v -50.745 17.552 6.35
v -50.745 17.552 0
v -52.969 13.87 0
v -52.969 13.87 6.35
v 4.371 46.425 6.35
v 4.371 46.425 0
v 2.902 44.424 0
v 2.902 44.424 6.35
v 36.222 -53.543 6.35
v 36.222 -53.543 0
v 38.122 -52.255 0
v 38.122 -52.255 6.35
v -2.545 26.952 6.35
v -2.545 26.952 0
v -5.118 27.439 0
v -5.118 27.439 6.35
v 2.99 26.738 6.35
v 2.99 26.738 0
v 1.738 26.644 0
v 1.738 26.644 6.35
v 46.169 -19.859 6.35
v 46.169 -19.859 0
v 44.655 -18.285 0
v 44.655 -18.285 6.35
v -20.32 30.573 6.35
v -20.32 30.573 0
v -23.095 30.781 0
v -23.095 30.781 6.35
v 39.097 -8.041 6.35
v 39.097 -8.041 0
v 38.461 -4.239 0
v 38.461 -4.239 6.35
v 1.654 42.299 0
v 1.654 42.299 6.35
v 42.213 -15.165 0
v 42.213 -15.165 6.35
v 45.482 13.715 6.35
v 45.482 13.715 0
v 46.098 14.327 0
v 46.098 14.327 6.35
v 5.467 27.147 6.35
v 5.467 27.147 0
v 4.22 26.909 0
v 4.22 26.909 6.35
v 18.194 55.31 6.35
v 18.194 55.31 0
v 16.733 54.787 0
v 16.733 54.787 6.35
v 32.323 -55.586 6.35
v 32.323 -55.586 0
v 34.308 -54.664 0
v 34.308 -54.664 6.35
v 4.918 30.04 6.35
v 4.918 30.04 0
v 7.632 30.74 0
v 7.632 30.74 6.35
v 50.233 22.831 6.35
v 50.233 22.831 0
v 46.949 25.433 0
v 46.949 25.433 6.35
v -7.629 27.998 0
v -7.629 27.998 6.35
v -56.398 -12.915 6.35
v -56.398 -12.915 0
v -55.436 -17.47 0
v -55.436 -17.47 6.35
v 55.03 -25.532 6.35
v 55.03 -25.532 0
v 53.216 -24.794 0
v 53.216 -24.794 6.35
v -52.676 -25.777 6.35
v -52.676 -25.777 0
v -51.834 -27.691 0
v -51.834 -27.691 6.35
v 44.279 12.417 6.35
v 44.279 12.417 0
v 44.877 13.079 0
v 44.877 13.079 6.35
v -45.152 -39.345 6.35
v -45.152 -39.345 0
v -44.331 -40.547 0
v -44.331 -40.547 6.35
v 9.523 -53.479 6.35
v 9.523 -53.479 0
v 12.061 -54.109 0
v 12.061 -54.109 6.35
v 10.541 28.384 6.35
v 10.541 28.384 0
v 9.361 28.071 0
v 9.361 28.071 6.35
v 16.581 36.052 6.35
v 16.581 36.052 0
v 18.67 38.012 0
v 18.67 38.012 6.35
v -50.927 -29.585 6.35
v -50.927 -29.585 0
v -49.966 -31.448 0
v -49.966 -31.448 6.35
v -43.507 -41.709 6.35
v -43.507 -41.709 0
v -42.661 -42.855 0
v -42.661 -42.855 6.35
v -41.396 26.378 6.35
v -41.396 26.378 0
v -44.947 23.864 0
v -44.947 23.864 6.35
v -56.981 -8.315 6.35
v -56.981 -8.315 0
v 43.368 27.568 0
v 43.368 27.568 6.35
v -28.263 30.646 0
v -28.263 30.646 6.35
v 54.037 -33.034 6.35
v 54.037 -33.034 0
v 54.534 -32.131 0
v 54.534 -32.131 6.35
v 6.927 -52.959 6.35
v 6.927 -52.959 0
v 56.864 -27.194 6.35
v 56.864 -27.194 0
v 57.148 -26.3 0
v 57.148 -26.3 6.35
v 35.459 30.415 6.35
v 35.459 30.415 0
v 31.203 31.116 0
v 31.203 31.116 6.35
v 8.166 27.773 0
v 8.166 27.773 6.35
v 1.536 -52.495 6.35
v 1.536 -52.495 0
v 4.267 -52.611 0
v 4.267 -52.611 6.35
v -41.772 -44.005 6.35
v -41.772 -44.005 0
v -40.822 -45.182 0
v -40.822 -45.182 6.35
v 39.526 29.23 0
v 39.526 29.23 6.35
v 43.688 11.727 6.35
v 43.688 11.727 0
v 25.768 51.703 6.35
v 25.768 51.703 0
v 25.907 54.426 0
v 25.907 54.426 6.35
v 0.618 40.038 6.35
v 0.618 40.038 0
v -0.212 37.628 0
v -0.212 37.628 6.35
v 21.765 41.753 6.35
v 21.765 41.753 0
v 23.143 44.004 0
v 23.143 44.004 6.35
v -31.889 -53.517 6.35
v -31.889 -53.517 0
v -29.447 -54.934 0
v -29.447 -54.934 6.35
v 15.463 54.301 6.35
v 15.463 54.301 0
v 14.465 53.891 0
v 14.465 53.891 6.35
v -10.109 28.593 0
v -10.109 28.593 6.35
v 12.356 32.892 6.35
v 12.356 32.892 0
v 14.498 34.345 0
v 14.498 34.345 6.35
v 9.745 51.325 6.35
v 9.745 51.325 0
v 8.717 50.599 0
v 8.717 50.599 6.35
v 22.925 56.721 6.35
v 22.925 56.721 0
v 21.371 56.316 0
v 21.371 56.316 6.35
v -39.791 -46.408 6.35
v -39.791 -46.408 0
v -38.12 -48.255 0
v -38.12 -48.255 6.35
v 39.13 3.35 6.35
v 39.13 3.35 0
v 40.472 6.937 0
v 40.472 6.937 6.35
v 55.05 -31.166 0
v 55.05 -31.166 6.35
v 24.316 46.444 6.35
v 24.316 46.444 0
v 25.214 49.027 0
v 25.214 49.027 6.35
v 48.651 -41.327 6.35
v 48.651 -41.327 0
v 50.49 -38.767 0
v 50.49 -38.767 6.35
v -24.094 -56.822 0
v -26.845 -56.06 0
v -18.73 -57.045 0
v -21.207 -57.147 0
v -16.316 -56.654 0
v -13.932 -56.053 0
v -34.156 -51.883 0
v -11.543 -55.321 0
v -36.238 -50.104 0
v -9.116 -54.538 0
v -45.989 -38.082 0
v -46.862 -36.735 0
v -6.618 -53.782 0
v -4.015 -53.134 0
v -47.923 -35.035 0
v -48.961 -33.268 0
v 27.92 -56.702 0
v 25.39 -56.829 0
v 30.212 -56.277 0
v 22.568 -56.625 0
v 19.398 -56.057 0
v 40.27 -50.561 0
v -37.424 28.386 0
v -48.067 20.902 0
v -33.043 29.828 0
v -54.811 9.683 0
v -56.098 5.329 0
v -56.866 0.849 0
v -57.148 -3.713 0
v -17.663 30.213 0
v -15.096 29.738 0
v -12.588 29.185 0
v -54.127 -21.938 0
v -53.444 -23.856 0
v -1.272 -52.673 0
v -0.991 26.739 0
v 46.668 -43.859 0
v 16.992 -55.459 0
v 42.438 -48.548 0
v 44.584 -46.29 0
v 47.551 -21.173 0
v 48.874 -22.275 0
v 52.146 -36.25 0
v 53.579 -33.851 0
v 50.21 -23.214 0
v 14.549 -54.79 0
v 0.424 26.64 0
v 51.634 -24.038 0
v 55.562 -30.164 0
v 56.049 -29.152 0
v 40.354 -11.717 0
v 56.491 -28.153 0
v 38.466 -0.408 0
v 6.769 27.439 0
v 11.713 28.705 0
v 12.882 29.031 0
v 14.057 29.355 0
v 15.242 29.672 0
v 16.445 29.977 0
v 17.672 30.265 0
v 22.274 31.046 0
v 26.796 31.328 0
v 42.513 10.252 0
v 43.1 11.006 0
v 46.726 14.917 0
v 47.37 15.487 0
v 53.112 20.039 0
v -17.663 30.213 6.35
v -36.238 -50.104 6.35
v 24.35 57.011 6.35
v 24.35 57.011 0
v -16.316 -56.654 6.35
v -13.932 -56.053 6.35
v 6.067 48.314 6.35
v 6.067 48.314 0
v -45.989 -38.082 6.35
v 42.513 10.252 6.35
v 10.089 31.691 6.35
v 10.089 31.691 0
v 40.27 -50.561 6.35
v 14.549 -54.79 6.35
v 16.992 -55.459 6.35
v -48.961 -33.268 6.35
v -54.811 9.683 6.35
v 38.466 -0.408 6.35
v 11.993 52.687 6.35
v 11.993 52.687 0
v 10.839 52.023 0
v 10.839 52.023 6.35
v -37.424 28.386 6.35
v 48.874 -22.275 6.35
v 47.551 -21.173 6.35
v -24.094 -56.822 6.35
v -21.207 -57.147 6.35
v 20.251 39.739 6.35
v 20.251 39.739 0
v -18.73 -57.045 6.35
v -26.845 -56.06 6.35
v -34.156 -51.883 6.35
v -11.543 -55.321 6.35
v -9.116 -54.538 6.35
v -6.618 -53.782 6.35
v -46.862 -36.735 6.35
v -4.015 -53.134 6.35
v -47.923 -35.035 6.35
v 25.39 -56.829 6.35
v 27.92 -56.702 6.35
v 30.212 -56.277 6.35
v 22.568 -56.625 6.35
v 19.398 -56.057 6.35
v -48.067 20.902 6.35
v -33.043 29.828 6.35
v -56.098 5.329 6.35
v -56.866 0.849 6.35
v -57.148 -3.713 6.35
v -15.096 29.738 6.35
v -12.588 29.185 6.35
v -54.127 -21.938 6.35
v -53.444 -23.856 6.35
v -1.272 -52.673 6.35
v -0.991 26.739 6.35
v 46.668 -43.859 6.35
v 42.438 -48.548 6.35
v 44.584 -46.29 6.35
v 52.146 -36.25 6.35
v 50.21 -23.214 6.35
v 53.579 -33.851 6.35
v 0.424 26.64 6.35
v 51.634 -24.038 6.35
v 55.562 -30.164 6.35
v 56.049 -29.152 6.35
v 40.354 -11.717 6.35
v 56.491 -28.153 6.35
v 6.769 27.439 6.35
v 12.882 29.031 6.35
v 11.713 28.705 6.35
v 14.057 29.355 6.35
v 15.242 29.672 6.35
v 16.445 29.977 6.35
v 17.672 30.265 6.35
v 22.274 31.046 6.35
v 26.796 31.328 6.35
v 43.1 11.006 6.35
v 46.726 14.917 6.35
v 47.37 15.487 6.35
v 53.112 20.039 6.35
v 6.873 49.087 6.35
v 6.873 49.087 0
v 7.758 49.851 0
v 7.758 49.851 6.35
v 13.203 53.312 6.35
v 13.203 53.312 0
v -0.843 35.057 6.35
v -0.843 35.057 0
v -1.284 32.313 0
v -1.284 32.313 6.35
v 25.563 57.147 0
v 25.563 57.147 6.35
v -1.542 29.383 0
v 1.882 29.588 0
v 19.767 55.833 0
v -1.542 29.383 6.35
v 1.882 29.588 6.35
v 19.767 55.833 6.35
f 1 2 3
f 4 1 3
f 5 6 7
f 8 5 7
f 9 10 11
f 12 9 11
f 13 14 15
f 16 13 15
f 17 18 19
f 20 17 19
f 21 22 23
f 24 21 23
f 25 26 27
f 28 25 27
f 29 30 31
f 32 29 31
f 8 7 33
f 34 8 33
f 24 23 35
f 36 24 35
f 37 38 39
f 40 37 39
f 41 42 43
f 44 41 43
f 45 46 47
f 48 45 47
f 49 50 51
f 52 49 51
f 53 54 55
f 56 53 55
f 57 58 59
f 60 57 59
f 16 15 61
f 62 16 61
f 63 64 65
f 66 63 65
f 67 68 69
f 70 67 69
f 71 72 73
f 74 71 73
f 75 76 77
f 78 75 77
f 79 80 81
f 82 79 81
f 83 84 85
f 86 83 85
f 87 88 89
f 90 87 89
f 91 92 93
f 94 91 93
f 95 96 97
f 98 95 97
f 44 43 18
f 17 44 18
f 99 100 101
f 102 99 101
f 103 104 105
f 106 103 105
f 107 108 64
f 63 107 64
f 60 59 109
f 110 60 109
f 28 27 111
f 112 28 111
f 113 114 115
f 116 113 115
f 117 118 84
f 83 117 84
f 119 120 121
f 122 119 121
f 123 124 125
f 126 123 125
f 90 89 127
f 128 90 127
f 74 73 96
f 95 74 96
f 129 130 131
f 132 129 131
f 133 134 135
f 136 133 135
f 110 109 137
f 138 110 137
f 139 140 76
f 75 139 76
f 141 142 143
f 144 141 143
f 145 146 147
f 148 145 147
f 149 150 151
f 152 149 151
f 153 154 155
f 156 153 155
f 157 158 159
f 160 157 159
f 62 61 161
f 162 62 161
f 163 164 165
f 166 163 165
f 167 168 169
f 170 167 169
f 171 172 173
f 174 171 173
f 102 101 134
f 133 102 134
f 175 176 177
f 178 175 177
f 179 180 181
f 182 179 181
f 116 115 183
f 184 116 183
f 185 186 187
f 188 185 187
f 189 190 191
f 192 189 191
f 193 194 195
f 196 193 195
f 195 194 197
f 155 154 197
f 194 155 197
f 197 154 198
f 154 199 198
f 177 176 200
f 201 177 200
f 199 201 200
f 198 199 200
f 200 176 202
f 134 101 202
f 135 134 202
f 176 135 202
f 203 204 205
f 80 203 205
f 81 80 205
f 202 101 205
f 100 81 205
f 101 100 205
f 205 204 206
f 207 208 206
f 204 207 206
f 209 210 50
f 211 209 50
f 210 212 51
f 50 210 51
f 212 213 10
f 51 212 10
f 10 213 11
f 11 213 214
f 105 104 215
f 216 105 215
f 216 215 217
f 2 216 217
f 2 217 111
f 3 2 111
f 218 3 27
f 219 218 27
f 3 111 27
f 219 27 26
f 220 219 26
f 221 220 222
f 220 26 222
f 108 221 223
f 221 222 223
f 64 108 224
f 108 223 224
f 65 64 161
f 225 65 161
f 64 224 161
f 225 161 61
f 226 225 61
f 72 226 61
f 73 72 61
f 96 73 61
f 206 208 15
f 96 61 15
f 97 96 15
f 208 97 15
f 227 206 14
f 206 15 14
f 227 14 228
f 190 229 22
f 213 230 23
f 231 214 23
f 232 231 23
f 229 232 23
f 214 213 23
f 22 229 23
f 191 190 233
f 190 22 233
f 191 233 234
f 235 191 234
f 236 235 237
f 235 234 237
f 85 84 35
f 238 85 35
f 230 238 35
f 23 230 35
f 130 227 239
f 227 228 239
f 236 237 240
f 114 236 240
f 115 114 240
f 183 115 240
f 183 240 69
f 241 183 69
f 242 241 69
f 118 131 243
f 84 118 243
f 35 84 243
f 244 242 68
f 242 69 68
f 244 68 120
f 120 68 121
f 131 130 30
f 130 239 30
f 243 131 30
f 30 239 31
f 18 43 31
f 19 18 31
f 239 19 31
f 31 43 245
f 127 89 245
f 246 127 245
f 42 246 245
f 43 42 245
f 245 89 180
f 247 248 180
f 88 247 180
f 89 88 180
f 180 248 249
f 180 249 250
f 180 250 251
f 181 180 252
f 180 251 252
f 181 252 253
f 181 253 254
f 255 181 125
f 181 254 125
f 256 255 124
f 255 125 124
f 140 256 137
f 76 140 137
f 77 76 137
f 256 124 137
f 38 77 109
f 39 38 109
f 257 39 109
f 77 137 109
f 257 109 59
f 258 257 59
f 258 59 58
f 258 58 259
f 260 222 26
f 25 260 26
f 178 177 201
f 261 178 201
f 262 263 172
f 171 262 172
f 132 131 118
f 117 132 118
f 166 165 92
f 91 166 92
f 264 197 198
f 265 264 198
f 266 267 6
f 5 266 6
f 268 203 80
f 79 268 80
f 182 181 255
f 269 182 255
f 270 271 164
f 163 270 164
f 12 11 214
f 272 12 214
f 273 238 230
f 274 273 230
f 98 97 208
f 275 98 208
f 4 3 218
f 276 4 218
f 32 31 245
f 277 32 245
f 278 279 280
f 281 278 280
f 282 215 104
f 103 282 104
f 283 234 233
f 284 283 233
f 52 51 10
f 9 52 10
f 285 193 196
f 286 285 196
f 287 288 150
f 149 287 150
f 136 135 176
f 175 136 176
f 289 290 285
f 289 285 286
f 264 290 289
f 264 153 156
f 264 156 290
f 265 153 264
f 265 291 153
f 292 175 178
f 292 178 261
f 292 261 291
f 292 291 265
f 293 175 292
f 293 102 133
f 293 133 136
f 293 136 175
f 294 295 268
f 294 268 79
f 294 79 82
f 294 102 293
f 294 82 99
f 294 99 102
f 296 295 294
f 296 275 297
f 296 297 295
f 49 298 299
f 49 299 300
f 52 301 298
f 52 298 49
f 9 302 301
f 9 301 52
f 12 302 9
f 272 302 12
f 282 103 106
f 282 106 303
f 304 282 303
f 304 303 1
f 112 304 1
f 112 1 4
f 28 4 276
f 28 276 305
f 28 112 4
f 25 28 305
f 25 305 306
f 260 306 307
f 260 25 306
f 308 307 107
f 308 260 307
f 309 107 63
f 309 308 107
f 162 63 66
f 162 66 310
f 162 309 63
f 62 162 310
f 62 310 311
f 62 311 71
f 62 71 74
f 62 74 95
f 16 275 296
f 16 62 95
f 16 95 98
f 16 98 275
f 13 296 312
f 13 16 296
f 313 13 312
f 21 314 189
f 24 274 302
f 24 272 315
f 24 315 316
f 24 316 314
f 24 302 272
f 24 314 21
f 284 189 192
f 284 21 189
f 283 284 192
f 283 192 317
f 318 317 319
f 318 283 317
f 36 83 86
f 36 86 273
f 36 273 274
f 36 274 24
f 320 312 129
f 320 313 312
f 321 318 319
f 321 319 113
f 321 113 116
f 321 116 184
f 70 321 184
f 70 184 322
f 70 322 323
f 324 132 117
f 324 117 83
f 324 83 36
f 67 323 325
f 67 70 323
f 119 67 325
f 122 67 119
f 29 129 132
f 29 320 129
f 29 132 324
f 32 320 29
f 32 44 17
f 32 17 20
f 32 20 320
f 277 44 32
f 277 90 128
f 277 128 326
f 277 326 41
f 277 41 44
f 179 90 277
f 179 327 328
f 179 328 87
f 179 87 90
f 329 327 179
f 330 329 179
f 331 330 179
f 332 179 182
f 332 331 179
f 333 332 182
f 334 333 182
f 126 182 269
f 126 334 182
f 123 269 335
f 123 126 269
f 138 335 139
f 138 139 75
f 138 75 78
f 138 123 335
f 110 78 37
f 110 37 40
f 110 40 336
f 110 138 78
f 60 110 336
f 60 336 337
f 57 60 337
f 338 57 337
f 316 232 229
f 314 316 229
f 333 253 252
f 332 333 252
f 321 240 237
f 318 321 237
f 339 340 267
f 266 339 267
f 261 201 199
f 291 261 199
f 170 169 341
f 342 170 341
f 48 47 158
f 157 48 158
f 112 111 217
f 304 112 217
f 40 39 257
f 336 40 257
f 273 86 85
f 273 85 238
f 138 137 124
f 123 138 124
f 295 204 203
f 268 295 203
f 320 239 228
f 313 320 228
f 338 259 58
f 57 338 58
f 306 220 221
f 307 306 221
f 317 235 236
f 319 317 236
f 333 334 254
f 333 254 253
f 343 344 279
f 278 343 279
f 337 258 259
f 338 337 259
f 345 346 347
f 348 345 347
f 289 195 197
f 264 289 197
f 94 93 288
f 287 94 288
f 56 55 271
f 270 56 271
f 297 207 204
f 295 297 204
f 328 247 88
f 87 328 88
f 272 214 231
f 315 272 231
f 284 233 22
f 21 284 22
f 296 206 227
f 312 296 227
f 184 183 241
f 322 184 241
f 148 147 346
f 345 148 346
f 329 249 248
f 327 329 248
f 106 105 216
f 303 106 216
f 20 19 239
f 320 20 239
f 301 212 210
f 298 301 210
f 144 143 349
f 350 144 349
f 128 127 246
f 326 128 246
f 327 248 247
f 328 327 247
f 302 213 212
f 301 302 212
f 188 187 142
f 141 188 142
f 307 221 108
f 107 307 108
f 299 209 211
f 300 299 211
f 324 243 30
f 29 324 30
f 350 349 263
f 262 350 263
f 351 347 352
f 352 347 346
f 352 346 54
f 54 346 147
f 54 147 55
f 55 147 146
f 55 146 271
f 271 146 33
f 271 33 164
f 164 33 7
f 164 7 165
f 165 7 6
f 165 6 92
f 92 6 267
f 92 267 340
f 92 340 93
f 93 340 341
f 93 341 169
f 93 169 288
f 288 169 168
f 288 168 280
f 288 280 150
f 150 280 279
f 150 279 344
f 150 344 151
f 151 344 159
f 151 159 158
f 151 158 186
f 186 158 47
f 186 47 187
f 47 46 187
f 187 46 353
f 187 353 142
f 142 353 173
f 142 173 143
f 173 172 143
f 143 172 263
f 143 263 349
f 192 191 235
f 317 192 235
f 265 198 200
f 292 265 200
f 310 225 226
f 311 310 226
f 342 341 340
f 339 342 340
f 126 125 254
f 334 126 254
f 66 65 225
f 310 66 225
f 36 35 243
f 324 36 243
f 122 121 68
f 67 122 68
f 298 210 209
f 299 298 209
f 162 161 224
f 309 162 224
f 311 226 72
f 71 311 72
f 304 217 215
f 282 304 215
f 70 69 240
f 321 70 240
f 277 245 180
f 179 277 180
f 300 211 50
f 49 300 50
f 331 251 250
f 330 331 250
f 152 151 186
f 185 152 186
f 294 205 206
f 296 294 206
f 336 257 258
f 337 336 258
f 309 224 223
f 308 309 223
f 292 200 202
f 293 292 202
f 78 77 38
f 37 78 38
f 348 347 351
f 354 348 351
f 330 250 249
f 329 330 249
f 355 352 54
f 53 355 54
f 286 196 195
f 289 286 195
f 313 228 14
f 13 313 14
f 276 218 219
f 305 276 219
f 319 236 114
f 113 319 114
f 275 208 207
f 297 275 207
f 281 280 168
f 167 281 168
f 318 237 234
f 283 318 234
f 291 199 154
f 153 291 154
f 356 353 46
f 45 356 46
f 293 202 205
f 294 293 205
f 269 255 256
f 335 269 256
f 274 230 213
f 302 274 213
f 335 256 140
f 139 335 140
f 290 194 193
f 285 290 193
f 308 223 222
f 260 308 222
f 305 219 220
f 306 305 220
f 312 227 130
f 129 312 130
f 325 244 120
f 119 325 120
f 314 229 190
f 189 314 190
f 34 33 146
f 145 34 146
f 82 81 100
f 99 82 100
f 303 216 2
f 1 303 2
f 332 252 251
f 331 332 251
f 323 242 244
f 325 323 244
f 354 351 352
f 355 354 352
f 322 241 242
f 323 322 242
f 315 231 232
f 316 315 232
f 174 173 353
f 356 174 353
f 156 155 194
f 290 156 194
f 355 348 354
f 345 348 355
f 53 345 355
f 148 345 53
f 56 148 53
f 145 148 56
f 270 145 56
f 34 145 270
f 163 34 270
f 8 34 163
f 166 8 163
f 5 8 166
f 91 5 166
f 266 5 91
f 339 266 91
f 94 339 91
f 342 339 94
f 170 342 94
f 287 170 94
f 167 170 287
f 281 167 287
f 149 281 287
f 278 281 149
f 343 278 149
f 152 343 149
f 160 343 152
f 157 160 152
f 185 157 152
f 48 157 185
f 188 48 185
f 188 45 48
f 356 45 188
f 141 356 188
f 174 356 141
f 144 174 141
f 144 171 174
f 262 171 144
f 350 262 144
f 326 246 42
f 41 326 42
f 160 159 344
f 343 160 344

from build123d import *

# Parameters (mm, degrees)
F1_DEPTH = 6.35
F2_DEPTH = 6.35


with BuildPart() as f1:
    # F0 (on Top) → F1 (new body)
    with BuildSketch(Plane.XY):
        Polygon((56.864021, -27.194281), (57.148324, -26.299795), (55.02971, -25.532283), (53.215718, -24.794286), (51.633501, -24.037595), (50.210415, -23.214), (48.873715, -22.27519), (47.550705, -21.172983), (46.168716, -19.859092), (44.655003, -18.285384), (42.213124, -15.164587), (40.354123, -11.71669), (39.097001, -8.041386), (38.461112, -4.2386), (38.465506, -0.408102), (39.129513, 3.350311), (40.472106, 6.936918), (42.512717, 10.251796), (43.099711, 11.005617), (43.687822, 11.726596), (44.279414, 12.417019), (44.87672, 13.078917), (45.482104, 13.714705), (46.097901, 14.326514), (46.726323, 14.916607), (47.369705, 15.487218), (53.111502, 20.039), (50.232818, 22.831095), (46.949411, 25.433198), (43.368214, 27.568119), (39.525905, 29.230498), (35.458806, 30.415001), (31.203417, 31.116016), (26.796213, 31.328309), (22.273717, 31.046395), (17.672304, 30.264913), (16.445205, 29.977309), (15.24221, 29.672204), (14.056716, 29.355009), (12.882321, 29.031006), (11.7126, 28.705404), (10.541, 28.383509), (9.361018, 28.07081), (8.166303, 27.772512), (6.769303, 27.439112), (5.467121, 27.147418), (4.220413, 26.909497), (2.990418, 26.737513), (1.737919, 26.643609), (0.423901, 26.639901), (-0.990676, 26.738504), (-2.544978, 26.951711), (-5.117694, 27.438706), (-7.629093, 27.998217), (-10.1092, 28.592805), (-12.588189, 29.185006), (-15.096185, 29.737507), (-17.663389, 30.212716), (-20.319695, 30.573116), (-23.095382, 30.781396), (-28.262885, 30.645913), (-33.042682, 29.827703), (-37.424081, 28.385516), (-41.39598, 26.378002), (-44.947281, 23.864113), (-48.06729, 20.902295), (-50.74478, 17.551502), (-52.968982, 13.870407), (-54.810787, 9.683217), (-56.098084, 5.328717), (-56.865596, 0.8493), (-57.148298, -3.712693), (-56.980887, -8.314792), (-56.398389, -12.914782), (-55.4355, -17.470095), (-54.126994, -21.938488), (-53.444191, -23.855985), (-52.6764, -25.777292), (-51.833882, -27.690801), (-50.927076, -29.584904), (-49.966194, -31.447892), (-48.961497, -33.268387), (-47.923196, -35.034601), (-46.861781, -36.734902), (-45.988783, -38.081585), (-45.1517, -39.344905), (-44.330976, -40.546884), (-43.507177, -41.709492), (-42.660799, -42.854905), (-41.772383, -44.005094), (-40.822296, -45.182282), (-39.791183, -46.408391), (-38.120193, -48.255301), (-36.237799, -50.104497), (-34.156498, -51.882802), (-31.888786, -53.516886), (-29.447388, -54.933596), (-26.844777, -56.059603), (-24.093678, -56.821705), (-21.206587, -57.146596), (-18.730087, -57.045301), (-16.316477, -56.654294), (-13.932078, -56.053203), (-11.543284, -55.3212), (-9.116492, -54.537788), (-6.618199, -53.78229), (-4.014699, -53.134184), (-1.272388, -52.672894), (1.535913, -52.495196), (4.266819, -52.610893), (6.92691, -52.959102), (9.522816, -53.478887), (12.061215, -54.109493), (14.548815, -54.789883), (16.992219, -55.459198), (19.398107, -56.056581), (22.568306, -56.624982), (25.390424, -56.829096), (27.919909, -56.701995), (30.212208, -56.276697), (32.3231, -55.586401), (34.307907, -54.664), (36.222203, -53.542692), (38.121717, -52.255496), (40.269922, -50.560681), (42.437507, -48.547985), (44.583807, -46.2899), (46.668411, -43.858688), (48.650703, -41.326892), (50.49012, -38.766598), (52.146302, -36.250397), (53.578506, -33.850605), (54.036519, -33.034199), (54.534003, -32.130898), (55.049623, -31.165902), (55.561916, -30.164481), (56.049316, -29.151885), (56.490514, -28.153487), align=None)
    extrude(amount=F1_DEPTH)


with BuildPart() as f2:
    # F0 (on Top) → F2 (new body)
    with BuildSketch(Plane.XY):
        Polygon((-1.284376, 32.312915), (-1.541678, 29.383406), (1.882013, 29.587596), (4.917821, 30.039615), (7.631506, 30.740299), (10.088804, 31.69092), (12.355601, 32.892213), (14.497507, 34.345499), (16.580612, 36.051617), (18.670422, 38.011608), (20.250506, 39.739418), (21.764523, 41.752799), (23.142804, 44.003697), (24.315725, 46.444408), (25.21392, 49.026902), (25.767513, 51.703402), (25.907213, 54.425901), (25.563322, 57.146596), (24.349608, 57.010808), (22.925405, 56.721019), (21.371204, 56.315508), (19.767423, 55.832604), (18.194325, 55.310405), (16.732606, 54.787317), (15.462707, 54.301415), (14.464919, 53.891104), (13.203022, 53.312009), (11.992813, 52.687195), (10.838713, 52.022705), (9.745218, 51.32451), (8.716823, 50.598603), (7.757922, 49.850904), (6.873113, 49.087405), (6.066815, 48.314102), (4.370603, 46.424799), (2.902102, 44.423813), (1.653718, 42.298798), (0.618211, 40.037512), (-0.211785, 37.627611), (-0.843483, 35.056902), align=None)
    extrude(amount=F2_DEPTH)


solid = Compound([f1.part, f2.part])
